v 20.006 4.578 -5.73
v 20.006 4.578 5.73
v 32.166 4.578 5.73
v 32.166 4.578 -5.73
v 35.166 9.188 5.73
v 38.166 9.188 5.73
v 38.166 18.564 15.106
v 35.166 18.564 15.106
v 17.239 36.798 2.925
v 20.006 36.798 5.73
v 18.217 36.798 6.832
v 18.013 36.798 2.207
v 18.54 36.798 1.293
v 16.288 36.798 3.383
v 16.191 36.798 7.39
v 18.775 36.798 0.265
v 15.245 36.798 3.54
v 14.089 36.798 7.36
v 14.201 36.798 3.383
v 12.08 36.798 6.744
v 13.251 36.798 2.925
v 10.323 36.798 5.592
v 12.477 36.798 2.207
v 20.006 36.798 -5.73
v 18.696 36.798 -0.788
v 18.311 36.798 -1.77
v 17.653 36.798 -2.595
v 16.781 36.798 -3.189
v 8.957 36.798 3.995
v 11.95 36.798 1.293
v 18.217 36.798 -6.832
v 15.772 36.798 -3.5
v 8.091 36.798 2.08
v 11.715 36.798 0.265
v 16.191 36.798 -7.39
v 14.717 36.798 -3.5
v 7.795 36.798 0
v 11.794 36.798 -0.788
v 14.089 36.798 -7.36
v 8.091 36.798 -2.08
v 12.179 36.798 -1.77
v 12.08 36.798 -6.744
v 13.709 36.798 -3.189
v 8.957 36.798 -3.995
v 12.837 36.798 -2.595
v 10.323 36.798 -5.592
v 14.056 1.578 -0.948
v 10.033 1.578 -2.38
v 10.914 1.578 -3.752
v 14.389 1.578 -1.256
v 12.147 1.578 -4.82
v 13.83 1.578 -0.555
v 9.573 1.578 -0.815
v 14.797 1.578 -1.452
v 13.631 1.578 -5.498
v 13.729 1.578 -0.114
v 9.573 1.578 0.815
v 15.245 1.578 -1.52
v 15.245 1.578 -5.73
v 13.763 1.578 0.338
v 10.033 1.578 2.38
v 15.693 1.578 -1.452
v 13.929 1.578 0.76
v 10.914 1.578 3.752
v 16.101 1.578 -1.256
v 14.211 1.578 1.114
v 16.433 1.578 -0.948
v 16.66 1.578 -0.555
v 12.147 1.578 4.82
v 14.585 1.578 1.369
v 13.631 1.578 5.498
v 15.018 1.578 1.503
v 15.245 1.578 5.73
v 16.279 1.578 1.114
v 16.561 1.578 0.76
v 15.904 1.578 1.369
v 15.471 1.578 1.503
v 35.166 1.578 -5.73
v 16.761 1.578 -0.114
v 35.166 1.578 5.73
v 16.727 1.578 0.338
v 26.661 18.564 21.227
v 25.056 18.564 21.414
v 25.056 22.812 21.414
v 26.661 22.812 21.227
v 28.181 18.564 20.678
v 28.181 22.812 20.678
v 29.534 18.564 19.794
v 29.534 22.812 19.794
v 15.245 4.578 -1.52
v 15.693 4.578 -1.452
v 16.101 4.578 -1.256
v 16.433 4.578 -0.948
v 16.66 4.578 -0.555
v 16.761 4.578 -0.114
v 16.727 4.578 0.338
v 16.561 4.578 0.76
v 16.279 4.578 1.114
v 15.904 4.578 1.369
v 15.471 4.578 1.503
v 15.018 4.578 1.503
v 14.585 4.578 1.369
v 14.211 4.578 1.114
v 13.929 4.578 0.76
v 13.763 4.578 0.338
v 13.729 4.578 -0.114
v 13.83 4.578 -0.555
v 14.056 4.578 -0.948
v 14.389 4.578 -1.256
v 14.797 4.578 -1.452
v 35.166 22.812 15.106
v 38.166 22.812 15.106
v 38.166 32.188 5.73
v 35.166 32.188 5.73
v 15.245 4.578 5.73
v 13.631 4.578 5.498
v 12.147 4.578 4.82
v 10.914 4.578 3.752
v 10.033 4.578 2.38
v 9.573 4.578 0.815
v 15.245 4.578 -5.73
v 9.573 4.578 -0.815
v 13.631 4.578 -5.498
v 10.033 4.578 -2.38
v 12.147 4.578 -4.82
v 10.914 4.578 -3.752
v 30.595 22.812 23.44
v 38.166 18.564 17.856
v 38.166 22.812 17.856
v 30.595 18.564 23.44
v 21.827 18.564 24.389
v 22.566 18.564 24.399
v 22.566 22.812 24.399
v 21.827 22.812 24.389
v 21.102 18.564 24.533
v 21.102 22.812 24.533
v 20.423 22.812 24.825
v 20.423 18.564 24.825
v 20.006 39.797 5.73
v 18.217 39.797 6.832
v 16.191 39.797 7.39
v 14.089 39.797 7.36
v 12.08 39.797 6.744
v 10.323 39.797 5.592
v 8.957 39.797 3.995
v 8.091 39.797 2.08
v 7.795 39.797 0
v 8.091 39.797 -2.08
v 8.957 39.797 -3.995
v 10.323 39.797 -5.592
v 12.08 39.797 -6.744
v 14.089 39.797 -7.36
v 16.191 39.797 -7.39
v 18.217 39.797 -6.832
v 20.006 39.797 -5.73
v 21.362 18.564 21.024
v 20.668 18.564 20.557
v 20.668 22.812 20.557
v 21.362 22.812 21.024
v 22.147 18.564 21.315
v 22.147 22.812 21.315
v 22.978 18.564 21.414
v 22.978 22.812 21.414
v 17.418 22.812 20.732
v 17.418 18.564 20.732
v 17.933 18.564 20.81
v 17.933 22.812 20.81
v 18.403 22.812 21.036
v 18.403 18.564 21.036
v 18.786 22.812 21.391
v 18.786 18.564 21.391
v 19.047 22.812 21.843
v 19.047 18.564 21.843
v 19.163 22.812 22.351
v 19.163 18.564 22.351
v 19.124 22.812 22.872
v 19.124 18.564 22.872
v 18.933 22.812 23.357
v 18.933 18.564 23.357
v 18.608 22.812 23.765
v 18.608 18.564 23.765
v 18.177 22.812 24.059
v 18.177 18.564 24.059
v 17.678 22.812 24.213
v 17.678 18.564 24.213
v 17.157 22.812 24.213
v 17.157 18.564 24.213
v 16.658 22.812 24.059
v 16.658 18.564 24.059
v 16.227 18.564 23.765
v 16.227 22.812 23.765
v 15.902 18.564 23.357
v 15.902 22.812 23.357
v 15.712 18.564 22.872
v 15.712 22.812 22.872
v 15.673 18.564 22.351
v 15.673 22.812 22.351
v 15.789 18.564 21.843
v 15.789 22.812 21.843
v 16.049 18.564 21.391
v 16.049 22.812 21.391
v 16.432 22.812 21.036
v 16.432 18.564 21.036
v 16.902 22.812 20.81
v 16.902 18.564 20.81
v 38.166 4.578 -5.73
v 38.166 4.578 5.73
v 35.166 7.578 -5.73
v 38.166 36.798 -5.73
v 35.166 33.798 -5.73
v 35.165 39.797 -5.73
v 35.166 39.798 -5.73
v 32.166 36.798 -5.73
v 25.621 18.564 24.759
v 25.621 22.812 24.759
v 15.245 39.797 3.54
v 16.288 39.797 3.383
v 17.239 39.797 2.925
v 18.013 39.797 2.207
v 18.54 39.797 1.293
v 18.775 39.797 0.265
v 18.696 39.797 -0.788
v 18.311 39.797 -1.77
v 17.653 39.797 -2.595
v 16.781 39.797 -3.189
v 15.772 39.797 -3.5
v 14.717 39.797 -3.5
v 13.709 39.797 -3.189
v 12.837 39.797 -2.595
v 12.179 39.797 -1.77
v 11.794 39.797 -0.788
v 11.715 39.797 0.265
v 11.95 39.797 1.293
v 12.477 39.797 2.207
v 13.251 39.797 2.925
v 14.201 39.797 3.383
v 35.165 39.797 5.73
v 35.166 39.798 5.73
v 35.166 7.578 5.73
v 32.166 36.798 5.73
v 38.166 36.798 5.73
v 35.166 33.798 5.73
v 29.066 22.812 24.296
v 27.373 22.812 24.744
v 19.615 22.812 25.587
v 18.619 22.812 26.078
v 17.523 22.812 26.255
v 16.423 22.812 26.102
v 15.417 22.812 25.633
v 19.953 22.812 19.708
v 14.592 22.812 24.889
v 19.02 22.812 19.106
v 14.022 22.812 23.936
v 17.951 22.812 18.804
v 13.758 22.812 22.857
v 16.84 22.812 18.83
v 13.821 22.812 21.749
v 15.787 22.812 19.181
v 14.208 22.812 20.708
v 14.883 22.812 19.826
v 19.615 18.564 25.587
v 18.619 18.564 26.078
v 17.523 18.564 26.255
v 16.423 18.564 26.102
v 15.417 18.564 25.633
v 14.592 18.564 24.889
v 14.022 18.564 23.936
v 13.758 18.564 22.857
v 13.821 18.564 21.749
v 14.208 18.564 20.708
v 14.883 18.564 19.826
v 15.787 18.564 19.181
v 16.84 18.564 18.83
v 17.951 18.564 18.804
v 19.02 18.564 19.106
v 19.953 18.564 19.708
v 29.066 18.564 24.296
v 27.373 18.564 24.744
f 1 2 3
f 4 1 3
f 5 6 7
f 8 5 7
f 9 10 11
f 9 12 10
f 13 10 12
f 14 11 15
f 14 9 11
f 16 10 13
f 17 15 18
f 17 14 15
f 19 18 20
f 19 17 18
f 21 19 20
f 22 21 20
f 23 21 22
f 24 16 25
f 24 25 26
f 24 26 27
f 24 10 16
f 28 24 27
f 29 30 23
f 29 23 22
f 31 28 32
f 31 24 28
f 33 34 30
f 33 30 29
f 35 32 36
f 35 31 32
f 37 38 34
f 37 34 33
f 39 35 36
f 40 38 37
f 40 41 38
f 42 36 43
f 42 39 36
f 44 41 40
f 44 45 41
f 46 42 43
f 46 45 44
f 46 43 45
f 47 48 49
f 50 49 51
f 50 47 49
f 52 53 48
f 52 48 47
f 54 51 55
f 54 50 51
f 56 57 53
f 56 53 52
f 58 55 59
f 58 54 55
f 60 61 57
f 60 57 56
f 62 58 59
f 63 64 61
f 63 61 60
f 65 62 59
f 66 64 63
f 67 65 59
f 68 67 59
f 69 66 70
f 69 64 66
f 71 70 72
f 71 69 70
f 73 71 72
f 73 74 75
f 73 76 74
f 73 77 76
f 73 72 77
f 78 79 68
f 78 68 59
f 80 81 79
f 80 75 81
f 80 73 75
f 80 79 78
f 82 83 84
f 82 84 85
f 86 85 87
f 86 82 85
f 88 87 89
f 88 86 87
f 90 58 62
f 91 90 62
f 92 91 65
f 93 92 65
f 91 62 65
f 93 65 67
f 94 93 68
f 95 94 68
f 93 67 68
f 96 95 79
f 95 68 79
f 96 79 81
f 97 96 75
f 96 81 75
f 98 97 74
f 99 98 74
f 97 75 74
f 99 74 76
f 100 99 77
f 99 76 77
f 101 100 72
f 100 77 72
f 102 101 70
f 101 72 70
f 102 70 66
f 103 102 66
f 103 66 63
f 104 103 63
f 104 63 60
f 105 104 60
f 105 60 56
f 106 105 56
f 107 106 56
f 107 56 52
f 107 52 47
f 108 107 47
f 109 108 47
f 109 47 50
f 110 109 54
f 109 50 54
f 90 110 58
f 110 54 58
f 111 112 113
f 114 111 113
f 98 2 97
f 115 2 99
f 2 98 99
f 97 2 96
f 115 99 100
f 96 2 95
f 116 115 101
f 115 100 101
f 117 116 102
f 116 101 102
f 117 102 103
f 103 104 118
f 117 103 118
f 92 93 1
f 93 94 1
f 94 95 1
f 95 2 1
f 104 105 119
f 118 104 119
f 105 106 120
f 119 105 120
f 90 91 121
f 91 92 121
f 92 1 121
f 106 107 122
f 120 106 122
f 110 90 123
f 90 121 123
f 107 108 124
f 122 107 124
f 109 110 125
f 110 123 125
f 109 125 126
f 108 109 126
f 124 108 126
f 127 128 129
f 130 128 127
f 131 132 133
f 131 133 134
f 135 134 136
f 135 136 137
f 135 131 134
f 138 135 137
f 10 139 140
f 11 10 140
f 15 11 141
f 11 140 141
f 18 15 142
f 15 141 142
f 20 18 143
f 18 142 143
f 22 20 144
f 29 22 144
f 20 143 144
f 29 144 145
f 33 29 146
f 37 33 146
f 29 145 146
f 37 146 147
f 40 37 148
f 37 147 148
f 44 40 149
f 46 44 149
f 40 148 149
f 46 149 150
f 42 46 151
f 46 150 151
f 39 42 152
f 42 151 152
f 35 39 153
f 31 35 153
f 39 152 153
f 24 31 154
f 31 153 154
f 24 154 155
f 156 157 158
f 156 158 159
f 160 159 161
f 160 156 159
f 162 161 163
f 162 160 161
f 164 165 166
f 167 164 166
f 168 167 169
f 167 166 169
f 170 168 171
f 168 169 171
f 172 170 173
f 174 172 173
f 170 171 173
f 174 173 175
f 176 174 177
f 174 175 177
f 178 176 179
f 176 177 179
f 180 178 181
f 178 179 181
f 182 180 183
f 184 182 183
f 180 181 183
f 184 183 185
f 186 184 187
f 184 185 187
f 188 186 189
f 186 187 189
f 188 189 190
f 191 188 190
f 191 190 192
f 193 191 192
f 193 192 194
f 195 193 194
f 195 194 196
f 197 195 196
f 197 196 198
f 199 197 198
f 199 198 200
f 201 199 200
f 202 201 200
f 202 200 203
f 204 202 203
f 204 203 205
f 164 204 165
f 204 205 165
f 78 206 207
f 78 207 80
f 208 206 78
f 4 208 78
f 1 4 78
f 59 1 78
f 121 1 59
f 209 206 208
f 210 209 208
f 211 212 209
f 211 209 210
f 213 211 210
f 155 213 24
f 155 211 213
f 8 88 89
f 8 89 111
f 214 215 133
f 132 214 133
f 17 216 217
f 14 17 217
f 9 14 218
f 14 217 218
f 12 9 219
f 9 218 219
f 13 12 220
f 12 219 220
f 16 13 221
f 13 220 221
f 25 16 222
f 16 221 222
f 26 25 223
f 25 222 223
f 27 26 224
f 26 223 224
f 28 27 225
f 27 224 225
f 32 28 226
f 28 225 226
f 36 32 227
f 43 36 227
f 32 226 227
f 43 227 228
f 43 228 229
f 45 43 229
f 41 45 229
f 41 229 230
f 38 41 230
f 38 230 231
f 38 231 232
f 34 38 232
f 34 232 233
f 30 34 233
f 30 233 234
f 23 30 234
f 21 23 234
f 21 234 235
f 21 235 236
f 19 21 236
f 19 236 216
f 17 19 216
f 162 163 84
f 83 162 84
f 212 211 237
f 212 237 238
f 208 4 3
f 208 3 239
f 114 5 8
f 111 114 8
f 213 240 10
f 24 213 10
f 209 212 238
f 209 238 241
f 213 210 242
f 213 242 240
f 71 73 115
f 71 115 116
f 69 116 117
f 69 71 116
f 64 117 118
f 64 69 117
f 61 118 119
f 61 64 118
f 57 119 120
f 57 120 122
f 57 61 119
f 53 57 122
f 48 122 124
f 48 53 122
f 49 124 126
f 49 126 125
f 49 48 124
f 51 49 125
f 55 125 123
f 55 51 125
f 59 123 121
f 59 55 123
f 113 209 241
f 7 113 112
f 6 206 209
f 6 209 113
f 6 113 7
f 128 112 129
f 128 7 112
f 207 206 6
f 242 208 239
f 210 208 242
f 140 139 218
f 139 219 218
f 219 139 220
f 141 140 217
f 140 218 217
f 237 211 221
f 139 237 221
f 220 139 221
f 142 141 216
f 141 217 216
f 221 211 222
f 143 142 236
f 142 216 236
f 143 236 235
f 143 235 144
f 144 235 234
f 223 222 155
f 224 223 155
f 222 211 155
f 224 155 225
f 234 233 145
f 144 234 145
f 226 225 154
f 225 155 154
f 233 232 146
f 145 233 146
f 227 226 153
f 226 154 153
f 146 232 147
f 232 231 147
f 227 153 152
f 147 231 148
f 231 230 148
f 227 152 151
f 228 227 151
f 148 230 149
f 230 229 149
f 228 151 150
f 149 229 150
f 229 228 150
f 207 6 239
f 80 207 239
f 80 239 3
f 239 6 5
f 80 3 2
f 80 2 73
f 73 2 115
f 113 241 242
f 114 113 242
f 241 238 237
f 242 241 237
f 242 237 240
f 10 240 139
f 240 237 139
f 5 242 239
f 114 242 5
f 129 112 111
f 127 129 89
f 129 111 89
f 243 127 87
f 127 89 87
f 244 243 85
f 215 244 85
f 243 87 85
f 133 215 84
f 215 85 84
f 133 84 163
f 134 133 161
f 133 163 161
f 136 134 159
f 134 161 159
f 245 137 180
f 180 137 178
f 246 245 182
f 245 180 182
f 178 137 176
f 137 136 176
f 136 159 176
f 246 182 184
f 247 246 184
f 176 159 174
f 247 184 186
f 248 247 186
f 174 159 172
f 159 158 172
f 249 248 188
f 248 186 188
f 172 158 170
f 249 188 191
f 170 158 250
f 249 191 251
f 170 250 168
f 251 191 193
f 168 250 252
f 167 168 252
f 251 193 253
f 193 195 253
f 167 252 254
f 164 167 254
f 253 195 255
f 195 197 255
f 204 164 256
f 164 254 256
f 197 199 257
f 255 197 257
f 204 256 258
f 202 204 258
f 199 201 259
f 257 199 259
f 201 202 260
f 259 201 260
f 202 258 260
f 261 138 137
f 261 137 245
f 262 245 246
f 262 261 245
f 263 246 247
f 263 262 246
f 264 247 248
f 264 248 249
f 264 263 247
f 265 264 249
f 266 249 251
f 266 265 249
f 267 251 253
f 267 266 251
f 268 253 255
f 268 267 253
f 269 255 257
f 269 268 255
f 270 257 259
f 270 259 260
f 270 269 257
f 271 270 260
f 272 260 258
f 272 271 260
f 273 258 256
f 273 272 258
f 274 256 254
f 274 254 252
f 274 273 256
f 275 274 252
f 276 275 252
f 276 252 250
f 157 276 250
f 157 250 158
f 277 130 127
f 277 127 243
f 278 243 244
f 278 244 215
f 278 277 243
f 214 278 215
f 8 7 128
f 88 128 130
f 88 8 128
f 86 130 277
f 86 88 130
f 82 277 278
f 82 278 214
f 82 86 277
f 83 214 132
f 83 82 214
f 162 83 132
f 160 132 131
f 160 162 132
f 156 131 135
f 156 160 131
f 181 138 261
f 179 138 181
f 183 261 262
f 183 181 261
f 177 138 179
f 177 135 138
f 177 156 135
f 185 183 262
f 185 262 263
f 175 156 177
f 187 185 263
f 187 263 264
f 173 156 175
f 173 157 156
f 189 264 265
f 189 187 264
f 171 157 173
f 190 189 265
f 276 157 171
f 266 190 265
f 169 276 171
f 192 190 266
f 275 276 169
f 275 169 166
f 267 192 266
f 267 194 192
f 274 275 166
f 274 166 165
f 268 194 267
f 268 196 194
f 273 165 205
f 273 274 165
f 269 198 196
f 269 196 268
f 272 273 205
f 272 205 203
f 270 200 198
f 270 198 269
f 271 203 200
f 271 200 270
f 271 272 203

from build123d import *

# Parameters (mm, degrees)
BOSS_EXTRUDE1_DEPTH      = 5.73
BOSS_EXTRUDE1_DEPTH_BACK = 5.73
BOSS_EXTRUDE2_DEPTH      = 11.46
BOSS_EXTRUDE3_DEPTH      = 11.46
BOSS_EXTRUDE4_DEPTH      = 2.999321
SKETCH7_R                = 3.54
CUT_EXTRUDE2_DEPTH       = 2.999322
BOSS_EXTRUDE5_DEPTH      = 3
SKETCH11_R               = 1.52
CUT_EXTRUDE3_DEPTH       = 3
BOSS_EXTRUDE6_DEPTH      = 3.000001
BOSS_EXTRUDE7_DEPTH      = 4.24753
SKETCH15_R               = 1.75
CUT_EXTRUDE4_DEPTH       = 4.24753


with BuildPart() as part:
    # Sketch1 → Boss-Extrude1 (new, two sides: drawn at the far end of the back side and taken through both)
    with BuildSketch(Plane.XY.offset(-BOSS_EXTRUDE1_DEPTH_BACK)):
        Polygon((32.166139185, 36.798009468), (35.166138746, 39.798007166), (38.166139237, 36.798004811), (38.166139237, 4.578006273), (35.166137814, 1.578006712), (32.166137322, 4.578009067), (35.166137814, 7.578007696), (35.166137814, 33.798008976), align=None)
    extrude(amount=BOSS_EXTRUDE1_DEPTH + BOSS_EXTRUDE1_DEPTH_BACK)

    # Sketch2 → Boss-Extrude2 (add)
    with BuildSketch(Plane.XY.offset(5.73)):
        Polygon((32.166139185, 36.798009468), (20.006139185, 36.798009468), (20.006139185, 39.797331447), (32.166139185, 39.797331447), (35.165463026, 39.797331447), align=None)
    extrude(amount=-BOSS_EXTRUDE2_DEPTH)

    # Sketch3 → Boss-Extrude3 (add)
    with BuildSketch(Plane.XY.offset(5.73)):
        Polygon((32.166137322, 4.578009067), (35.166137814, 1.578006712), (32.166137322, 1.578006712), (20.006137322, 1.578006712), (20.006137322, 4.578009067), align=None)
    extrude(amount=-BOSS_EXTRUDE3_DEPTH)

    # Sketch4 → Boss-Extrude4 (add)
    with BuildSketch(Plane(origin=(0, 39.797331447, 0), x_dir=(1, 0, 0), z_dir=(0, 1, 0))):
        with BuildLine():
            Line((20.006139185, 5.73), (20.006139185, -5.73))
            ThreePointArc((20.006139185, -5.73), (7.794878848, 0), (20.006139185, 5.73))
        make_face()
    extrude(amount=-BOSS_EXTRUDE4_DEPTH)

    # Sketch7 → Cut-Extrude2 (cut)
    with BuildSketch(Plane(origin=(0, 39.797331447, 0), x_dir=(1, 0, 0), z_dir=(0, 1, 0))):
        with Locations(Location((15.244878848, 0, 0), (0, 0, 270))):
            Circle(SKETCH7_R)
    extrude(amount=-CUT_EXTRUDE2_DEPTH, mode=Mode.SUBTRACT)

    # Sketch9 → Boss-Extrude5 (add)
    with BuildSketch(Plane(origin=(0, 1.578006712, 0), x_dir=(-1, 0, 0), z_dir=(0, -1, 0))):
        with BuildLine():
            Line((-20.006139185, -5.73), (-15.244878848, -5.73))
            ThreePointArc((-15.244878848, -5.73), (-9.514878848, 0), (-15.244878848, 5.73))
            Line((-15.244878848, 5.73), (-20.006137322, 5.73))
            Line((-20.006137322, 5.73), (-20.006139185, -5.73))
        make_face()
    extrude(amount=-BOSS_EXTRUDE5_DEPTH)

    # Sketch11 → Cut-Extrude3 (cut)
    with BuildSketch(Plane(origin=(0, 1.578006712, 0), x_dir=(-1, 0, 0), z_dir=(0, -1, 0))):
        with Locations(Location((-15.244878848, 0, 0), (0, 0, 90))):
            Circle(SKETCH11_R)
    extrude(amount=-CUT_EXTRUDE3_DEPTH, mode=Mode.SUBTRACT)

    # Sketch12 → Boss-Extrude6 (add)
    with BuildSketch(Plane(origin=(38.166139237, 0, 0), x_dir=(0, 0, -1), z_dir=(1, 0, 0))):
        Polygon((-5.73, 32.188009468), (-5.73, 9.188006273), (-15.106235919, 18.564242191), (-15.106235919, 22.811773549), align=None)
    extrude(amount=-BOSS_EXTRUDE6_DEPTH)

    # Sketch14 → Boss-Extrude7 (add)
    with BuildSketch(Plane(origin=(0, 18.564244712, 0), x_dir=(-1, 0, 0), z_dir=(0, -1, 0))):
        with BuildLine():
            Line((-38.166139237, -15.106235919), (-38.166139237, -17.856235919))
            Line((-38.166139237, -17.856235919), (-30.594801522, -23.440347499))
            ThreePointArc((-30.594801522, -23.440347499), (-28.233323063, -24.573172743), (-25.620768045, -24.758725505))
            Line((-25.620768045, -24.758725505), (-22.565521767, -24.398737054))
            ThreePointArc((-22.565521767, -24.398737054), (-21.460785016, -24.442412716), (-20.423400376, -24.824752827))
            ThreePointArc((-20.423400376, -24.824752827), (-13.74802539, -22.300713773), (-20.66830721, -20.556837667))
            ThreePointArc((-20.66830721, -20.556837667), (-21.746000534, -21.192615252), (-22.977558626, -21.413750285))
            Line((-22.977558626, -21.413750285), (-25.055666544, -21.413750285))
            ThreePointArc((-25.055666544, -21.413750285), (-27.436600146, -20.996390727), (-29.53361792, -19.794080338))
            Line((-29.53361792, -19.794080338), (-35.166137814, -15.106235919))
            Line((-35.166137814, -15.106235919), (-38.166139237, -15.106235919))
        make_face()
    extrude(amount=-BOSS_EXTRUDE7_DEPTH)

    # Sketch15 → Cut-Extrude4 (cut)
    with BuildSketch(Plane(origin=(0, 18.564244712, 0), x_dir=(-1, 0, 0), z_dir=(0, -1, 0))):
        with Locations(Location((-17.41764683, -22.48214533, 0), (0, 0, 90))):
            Circle(SKETCH15_R)
    extrude(amount=-CUT_EXTRUDE4_DEPTH, mode=Mode.SUBTRACT)


solid = part.part
